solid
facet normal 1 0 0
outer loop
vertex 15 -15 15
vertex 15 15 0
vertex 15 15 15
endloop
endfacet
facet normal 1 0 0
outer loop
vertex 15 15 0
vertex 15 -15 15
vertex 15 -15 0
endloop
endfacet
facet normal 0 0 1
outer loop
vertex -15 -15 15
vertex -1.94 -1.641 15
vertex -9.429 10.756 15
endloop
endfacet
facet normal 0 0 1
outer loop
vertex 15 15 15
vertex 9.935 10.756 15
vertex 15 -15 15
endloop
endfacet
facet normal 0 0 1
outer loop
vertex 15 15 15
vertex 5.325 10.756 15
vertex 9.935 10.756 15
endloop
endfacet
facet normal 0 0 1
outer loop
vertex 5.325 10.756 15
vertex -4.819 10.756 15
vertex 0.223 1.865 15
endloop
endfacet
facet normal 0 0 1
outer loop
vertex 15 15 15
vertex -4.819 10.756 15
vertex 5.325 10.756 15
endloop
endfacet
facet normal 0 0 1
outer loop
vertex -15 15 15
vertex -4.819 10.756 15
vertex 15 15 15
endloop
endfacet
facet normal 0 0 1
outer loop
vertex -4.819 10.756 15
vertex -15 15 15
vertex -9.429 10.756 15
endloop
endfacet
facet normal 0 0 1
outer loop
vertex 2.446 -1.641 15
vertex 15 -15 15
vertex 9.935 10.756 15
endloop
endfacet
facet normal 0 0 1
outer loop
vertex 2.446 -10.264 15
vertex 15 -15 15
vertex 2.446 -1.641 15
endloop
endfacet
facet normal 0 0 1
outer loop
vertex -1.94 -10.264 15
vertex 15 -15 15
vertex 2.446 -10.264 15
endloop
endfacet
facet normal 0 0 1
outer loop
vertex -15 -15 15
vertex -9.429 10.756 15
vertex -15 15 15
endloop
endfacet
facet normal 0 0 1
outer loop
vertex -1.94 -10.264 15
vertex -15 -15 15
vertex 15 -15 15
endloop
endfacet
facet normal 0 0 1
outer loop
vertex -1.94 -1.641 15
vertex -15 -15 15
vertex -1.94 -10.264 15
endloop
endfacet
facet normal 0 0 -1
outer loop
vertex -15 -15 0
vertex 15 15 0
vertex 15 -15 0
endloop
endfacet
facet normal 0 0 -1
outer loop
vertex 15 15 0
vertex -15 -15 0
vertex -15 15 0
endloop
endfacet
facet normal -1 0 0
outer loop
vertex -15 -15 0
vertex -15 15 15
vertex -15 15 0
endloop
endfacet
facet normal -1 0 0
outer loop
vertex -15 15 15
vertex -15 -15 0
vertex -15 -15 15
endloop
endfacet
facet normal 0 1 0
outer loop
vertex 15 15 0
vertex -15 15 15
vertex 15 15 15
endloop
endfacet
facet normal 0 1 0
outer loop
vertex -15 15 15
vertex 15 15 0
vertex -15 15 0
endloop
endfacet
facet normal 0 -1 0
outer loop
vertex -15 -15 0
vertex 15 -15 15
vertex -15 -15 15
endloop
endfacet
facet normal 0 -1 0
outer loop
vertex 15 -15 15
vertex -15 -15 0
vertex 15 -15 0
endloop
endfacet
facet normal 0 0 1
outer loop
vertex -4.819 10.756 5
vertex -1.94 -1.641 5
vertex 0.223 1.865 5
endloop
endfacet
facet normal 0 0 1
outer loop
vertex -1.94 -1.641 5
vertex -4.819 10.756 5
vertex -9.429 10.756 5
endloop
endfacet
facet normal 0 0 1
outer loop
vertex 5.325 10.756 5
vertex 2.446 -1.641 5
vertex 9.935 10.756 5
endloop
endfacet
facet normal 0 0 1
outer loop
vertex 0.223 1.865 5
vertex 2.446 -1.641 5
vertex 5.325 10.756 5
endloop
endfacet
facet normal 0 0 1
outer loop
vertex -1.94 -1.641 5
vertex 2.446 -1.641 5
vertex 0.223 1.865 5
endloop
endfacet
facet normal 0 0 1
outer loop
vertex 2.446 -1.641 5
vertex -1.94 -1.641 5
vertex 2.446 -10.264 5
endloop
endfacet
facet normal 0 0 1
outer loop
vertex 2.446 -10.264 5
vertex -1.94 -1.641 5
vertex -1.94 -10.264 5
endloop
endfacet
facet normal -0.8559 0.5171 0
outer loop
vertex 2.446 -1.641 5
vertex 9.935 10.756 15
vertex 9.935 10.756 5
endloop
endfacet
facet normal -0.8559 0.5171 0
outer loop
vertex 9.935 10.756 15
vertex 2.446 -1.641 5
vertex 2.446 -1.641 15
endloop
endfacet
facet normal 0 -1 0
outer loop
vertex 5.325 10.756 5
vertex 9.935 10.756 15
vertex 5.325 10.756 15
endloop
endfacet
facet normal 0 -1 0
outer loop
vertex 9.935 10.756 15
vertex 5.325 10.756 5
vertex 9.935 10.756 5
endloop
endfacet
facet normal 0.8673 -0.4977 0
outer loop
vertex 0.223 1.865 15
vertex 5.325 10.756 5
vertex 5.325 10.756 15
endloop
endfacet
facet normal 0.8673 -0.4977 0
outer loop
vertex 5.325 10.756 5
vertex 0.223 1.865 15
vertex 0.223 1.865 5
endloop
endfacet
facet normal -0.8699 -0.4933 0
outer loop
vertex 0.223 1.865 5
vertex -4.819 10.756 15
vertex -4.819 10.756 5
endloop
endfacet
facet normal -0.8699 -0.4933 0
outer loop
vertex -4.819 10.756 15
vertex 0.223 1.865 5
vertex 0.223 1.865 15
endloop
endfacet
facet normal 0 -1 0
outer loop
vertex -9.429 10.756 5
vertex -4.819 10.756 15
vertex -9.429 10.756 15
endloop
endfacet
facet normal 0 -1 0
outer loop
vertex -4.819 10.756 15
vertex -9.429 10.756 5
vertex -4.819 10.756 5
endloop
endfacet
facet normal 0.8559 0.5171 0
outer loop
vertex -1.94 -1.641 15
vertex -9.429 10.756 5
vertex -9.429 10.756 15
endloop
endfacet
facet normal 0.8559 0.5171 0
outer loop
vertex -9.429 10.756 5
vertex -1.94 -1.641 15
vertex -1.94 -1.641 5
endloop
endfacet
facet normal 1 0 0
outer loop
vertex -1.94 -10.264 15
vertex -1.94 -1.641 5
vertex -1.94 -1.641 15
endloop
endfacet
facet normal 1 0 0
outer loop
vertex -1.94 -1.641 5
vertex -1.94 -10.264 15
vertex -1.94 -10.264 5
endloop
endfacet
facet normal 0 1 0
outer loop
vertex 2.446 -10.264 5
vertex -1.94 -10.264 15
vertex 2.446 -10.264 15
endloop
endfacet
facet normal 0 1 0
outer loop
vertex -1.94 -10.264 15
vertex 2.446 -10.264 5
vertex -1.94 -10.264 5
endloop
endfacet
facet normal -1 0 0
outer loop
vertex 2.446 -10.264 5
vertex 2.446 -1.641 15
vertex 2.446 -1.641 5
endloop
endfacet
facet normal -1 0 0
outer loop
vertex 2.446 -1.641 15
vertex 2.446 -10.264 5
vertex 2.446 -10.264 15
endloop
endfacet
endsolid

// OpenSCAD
// LetterBlock.scad - Basic usage of text() and linear_extrude()

// Module instantiation
LetterBlock("Y");

// Module definition.
// size=30 defines an optional parameter with a default value.
module LetterBlock(letter, size=30) {
    difference() {
        translate([0,0,size/4]) cube([size,size,size/2], center=true);
        translate([0,0,size/6]) {
            // convexity is needed for correct preview
            // since characters can be highly concave
            linear_extrude(height=size, convexity=4)
                text(letter,
                     size=size*22/30,
                     font="Liberation Sans:style=bold",
                     halign="center",
                     valign="center");
        }
    }
}

echo(version=version());
// Written by Marius Kintel <marius@kintel.net>
//
// To the extent possible under law, the author(s) have dedicated all
// copyright and related and neighboring rights to this software to the
// public domain worldwide. This software is distributed without any
// warranty.
//
// You should have received a copy of the CC0 Public Domain
// Dedication along with this software.
// If not, see <http://creativecommons.org/publicdomain/zero/1.0/>.
